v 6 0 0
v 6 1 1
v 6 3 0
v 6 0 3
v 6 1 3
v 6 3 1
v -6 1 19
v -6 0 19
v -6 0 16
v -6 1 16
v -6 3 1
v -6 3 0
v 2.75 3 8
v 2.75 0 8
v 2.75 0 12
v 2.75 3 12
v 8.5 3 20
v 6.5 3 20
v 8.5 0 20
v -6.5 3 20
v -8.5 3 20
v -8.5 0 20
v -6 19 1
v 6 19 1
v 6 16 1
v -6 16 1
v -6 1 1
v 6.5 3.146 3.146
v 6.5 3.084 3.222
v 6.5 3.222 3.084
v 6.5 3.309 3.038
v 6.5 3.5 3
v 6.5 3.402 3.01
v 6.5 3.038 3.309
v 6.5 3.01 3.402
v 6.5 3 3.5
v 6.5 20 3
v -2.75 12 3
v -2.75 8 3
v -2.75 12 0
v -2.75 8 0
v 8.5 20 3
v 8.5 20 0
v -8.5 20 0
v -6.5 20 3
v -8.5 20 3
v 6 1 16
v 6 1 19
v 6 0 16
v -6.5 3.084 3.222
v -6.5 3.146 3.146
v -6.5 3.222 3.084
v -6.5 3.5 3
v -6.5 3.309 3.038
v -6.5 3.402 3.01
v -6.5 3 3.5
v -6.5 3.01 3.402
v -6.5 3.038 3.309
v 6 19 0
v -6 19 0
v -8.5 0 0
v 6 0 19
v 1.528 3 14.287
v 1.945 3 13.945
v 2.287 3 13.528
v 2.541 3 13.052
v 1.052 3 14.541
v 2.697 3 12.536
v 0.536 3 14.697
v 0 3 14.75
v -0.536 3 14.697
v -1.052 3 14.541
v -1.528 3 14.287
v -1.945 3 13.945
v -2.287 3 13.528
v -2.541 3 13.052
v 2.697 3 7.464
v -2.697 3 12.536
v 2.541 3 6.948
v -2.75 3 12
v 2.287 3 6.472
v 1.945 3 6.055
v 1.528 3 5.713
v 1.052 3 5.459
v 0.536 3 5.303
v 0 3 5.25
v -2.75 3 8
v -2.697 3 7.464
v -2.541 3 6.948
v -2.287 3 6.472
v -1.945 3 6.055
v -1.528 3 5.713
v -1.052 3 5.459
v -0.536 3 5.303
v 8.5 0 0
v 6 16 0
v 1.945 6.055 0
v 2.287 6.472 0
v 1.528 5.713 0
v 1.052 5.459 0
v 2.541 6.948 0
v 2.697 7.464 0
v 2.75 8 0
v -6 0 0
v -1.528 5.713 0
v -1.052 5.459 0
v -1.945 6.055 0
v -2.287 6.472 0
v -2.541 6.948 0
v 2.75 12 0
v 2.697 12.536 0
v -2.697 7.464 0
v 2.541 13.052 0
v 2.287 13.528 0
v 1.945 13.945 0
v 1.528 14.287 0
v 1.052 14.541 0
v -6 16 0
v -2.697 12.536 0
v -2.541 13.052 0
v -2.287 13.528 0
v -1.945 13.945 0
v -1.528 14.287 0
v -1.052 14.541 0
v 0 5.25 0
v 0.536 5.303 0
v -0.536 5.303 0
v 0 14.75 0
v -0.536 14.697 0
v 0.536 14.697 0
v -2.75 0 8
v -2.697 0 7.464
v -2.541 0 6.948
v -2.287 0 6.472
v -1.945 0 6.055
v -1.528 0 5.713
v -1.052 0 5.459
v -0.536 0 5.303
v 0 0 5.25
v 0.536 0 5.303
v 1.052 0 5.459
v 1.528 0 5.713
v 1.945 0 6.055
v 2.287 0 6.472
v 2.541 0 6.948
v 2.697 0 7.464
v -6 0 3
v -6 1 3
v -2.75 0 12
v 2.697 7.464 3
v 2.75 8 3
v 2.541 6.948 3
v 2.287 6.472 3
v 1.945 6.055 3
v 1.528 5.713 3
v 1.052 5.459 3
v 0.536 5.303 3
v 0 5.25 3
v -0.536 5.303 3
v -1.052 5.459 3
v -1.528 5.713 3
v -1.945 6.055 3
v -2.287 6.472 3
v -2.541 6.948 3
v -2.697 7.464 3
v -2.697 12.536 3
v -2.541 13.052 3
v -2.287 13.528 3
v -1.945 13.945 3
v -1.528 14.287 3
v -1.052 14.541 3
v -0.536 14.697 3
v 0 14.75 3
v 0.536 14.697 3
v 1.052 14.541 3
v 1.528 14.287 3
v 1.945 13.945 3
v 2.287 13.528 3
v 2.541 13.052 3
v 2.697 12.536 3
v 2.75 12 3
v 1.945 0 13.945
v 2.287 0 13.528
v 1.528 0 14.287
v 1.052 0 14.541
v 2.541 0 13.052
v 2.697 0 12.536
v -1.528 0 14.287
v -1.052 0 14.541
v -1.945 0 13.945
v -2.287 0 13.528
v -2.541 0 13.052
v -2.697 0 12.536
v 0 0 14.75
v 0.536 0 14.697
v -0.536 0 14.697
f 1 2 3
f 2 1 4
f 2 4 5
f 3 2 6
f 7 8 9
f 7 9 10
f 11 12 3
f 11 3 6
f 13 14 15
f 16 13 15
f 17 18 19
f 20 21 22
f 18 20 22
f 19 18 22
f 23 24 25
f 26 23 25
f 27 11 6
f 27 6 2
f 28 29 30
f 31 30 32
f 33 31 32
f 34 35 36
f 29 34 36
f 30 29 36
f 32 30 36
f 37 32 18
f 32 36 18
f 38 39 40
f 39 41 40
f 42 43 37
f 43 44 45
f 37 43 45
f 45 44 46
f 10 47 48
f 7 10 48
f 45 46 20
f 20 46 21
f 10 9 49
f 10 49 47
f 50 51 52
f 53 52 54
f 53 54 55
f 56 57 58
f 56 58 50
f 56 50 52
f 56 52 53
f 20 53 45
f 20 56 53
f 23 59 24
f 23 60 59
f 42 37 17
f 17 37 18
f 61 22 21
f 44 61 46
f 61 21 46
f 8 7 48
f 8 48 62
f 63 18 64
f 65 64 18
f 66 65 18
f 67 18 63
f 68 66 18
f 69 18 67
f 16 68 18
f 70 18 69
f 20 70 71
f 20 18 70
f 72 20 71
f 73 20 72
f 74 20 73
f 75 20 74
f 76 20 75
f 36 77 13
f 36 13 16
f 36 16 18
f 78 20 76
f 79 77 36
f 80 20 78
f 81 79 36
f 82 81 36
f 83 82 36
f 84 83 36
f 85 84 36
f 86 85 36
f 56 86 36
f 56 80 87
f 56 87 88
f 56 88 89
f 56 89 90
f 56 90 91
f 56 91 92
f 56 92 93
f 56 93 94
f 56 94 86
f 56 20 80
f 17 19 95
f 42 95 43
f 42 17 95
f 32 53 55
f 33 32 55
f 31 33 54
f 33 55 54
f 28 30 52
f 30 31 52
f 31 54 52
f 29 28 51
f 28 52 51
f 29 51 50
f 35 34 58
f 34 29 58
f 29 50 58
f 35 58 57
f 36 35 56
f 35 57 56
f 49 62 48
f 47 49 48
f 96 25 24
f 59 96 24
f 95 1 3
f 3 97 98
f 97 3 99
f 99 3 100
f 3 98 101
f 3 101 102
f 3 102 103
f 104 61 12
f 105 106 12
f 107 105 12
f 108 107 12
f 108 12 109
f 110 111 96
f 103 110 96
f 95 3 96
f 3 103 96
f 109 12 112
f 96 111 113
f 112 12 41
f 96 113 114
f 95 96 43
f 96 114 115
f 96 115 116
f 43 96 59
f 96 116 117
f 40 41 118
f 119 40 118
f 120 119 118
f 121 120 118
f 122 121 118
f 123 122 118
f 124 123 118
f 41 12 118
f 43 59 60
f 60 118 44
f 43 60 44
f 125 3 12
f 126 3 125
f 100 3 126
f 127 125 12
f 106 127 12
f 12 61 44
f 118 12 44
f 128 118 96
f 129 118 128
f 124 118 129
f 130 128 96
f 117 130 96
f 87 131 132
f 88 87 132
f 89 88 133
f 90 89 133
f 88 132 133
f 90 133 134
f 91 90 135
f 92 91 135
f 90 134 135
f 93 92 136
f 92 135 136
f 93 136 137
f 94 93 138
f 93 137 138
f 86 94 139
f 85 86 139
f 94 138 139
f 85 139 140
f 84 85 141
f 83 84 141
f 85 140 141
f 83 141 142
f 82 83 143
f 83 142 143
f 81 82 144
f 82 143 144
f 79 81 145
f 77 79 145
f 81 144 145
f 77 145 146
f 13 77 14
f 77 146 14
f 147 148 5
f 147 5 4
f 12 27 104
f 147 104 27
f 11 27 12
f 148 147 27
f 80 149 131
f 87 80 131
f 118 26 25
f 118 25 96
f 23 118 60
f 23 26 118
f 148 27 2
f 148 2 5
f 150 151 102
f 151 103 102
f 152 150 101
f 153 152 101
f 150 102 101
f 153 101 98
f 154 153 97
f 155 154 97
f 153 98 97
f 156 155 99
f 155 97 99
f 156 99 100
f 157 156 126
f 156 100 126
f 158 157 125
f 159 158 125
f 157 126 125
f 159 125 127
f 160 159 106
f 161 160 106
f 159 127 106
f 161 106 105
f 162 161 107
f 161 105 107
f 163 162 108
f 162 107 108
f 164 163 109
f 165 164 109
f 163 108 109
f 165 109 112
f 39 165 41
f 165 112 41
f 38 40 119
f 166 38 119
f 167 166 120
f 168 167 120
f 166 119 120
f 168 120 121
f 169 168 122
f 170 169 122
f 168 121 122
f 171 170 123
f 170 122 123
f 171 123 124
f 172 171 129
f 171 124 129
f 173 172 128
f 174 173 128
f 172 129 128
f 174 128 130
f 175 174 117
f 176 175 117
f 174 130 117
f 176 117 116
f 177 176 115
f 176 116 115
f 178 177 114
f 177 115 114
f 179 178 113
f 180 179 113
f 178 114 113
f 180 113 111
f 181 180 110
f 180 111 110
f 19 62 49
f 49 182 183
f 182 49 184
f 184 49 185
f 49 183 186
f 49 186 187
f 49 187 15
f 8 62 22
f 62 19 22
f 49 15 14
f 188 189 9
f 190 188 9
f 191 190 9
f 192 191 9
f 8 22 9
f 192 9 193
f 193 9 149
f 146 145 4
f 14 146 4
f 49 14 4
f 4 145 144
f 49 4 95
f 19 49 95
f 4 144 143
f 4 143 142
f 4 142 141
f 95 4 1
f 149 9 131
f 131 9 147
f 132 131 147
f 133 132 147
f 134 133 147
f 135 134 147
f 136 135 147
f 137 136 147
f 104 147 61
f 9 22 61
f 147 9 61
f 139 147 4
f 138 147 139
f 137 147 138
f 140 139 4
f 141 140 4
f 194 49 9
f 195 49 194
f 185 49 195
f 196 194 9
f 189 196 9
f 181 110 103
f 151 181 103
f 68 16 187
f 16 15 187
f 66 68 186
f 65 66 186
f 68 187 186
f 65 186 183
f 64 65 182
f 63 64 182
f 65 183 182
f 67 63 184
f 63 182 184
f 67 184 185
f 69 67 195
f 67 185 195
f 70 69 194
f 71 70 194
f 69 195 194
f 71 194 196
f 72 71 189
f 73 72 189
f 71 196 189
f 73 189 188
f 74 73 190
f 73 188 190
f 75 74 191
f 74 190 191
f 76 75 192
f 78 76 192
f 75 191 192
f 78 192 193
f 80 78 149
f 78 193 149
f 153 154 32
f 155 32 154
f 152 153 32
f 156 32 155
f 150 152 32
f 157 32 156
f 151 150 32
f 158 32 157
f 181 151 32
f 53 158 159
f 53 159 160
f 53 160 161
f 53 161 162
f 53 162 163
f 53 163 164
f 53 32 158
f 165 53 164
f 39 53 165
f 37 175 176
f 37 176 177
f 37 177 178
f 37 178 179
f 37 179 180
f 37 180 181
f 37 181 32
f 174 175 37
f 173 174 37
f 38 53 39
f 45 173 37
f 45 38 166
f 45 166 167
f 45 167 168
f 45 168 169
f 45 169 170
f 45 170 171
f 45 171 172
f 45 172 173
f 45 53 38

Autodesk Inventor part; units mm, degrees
ref_plane "YZ Plane" through (0, 0, 0) normal (1, 0, 0) x (0, 1, 0)
ref_plane "XZ Plane" through (0, 0, 0) normal (0, 1, 0) x (-1, 0, 0)
ref_plane "XY Plane" through (0, 0, 0) normal (0, 0, 1) x (1, 0, 0)
sketch "Sketch_1" plane through (0, 0, 0) normal (1, 0, 0) x (0, 1, 0)
  line L0 (0, 20) -> (0, 0)
  line L1 (0, 0) -> (20, 0)
  line L2 (20, 0) -> (20, 3)
  line L3 (20, 3) -> (3, 20)
  line L4 (3, 20) -> (0, 20)
  dimension "d35" = 20
  dimension "d36" = 20
  dimension "d37" = 17
  dimension "d38" = 3
extrude "Extrusion1" add sketch "Sketch_1" along normal mid plane 17
sketch "Sketch_2" plane through (0, 0, 0) normal (1, 0, 0) x (0, 1, 0)
  line L0 (3, 20) -> (3, 3.5)
  arc A0 (3, 3.5) -> (3.5, 3) centre (3.5, 3.5) ccw
  line L1 (3.5, 3) -> (20, 3)
  line L2 (20, 3) -> (3, 20)
extrude "Extrusion2" cut sketch "Sketch_2" along normal mid plane 13
sketch "Sketch_3" plane through (0, 0, 0) normal (1, 0, 0) x (0, 1, 0)
  line L0 (0, 3) -> (0, 0)
  line L1 (0, 0) -> (3, 0)
  line L2 (3, 0) -> (3, 1)
  line L3 (3, 1) -> (1, 1)
  line L4 (1, 1) -> (1, 3)
  line L5 (1, 3) -> (0, 3)
extrude "Extrusion3" cut sketch "Sketch_3" along normal mid plane 12
sketch "Sketch_4" plane through (0, 0, 0) normal (1, 0, 0) x (0, 1, 0)
  line L0 (0, 19) -> (0, 16)
  line L1 (0, 16) -> (1, 16)
  line L2 (1, 16) -> (1, 19)
  line L3 (1, 19) -> (0, 19)
extrude "Extrusion4" cut sketch "Sketch_4" along normal mid plane 12
sketch "Sketch_5" plane through (0, 0, 0) normal (1, 0, 0) x (0, 1, 0)
  line L0 (16, 1) -> (16, 0)
  line L1 (16, 0) -> (19, 0)
  line L2 (19, 0) -> (19, 1)
  line L3 (19, 1) -> (16, 1)
extrude "Extrusion5" cut sketch "Sketch_5" along normal mid plane 12
sketch "Sketch8" plane through (-8.5, 0, 20) normal (0, -1, 0) x (1, 0, 0)
  line L0 (8.5, -8) -> (8.5, -12) construction
  line L1 (5.75, -8) -> (5.75, -12)
  line L2 (11.25, -12) -> (11.25, -8)
  arc A0 (11.25, -8) -> (5.75, -8) centre (8.5, -8) ccw
  arc A1 (5.75, -12) -> (11.25, -12) centre (8.5, -12) ccw
  line L3 (14.5, -20) -> (2.5, -20) projected
  line L4 (17, 0) -> (17, -20) projected
  point P0 (8.5, -20)
  point P1 (8.5, -10)
  dimension "d23" = 2
  dimension "d24" = 5.5
  dimension "d25" = 10
  dimension "d32" = 8.5
extrude "Extrusion8" cut sketch "Sketch8" against normal through all
sketch "Sketch9" plane through (8.5, 20, 0) normal (0, 0, -1) x (-1, 0, 0)
  line L0 (8.5, -8) -> (8.5, -12) construction
  line L1 (5.75, -8) -> (5.75, -12)
  line L2 (11.25, -12) -> (11.25, -8)
  arc A0 (11.25, -8) -> (5.75, -8) centre (8.5, -8) ccw
  arc A1 (5.75, -12) -> (11.25, -12) centre (8.5, -12) ccw
  line L3 (17, -20) -> (14.5, -20) projected
  line L4 (0, -20) -> (0, 0) projected
  point P0 (8.5, -20)
  point P1 (8.5, -10)
  dimension "d28" = 2
  dimension "d29" = 5.5
  dimension "d30" = 10
  dimension "d31" = 8.5
extrude "Extrusion9" cut sketch "Sketch9" against normal through all
properties part number "14056_m"
